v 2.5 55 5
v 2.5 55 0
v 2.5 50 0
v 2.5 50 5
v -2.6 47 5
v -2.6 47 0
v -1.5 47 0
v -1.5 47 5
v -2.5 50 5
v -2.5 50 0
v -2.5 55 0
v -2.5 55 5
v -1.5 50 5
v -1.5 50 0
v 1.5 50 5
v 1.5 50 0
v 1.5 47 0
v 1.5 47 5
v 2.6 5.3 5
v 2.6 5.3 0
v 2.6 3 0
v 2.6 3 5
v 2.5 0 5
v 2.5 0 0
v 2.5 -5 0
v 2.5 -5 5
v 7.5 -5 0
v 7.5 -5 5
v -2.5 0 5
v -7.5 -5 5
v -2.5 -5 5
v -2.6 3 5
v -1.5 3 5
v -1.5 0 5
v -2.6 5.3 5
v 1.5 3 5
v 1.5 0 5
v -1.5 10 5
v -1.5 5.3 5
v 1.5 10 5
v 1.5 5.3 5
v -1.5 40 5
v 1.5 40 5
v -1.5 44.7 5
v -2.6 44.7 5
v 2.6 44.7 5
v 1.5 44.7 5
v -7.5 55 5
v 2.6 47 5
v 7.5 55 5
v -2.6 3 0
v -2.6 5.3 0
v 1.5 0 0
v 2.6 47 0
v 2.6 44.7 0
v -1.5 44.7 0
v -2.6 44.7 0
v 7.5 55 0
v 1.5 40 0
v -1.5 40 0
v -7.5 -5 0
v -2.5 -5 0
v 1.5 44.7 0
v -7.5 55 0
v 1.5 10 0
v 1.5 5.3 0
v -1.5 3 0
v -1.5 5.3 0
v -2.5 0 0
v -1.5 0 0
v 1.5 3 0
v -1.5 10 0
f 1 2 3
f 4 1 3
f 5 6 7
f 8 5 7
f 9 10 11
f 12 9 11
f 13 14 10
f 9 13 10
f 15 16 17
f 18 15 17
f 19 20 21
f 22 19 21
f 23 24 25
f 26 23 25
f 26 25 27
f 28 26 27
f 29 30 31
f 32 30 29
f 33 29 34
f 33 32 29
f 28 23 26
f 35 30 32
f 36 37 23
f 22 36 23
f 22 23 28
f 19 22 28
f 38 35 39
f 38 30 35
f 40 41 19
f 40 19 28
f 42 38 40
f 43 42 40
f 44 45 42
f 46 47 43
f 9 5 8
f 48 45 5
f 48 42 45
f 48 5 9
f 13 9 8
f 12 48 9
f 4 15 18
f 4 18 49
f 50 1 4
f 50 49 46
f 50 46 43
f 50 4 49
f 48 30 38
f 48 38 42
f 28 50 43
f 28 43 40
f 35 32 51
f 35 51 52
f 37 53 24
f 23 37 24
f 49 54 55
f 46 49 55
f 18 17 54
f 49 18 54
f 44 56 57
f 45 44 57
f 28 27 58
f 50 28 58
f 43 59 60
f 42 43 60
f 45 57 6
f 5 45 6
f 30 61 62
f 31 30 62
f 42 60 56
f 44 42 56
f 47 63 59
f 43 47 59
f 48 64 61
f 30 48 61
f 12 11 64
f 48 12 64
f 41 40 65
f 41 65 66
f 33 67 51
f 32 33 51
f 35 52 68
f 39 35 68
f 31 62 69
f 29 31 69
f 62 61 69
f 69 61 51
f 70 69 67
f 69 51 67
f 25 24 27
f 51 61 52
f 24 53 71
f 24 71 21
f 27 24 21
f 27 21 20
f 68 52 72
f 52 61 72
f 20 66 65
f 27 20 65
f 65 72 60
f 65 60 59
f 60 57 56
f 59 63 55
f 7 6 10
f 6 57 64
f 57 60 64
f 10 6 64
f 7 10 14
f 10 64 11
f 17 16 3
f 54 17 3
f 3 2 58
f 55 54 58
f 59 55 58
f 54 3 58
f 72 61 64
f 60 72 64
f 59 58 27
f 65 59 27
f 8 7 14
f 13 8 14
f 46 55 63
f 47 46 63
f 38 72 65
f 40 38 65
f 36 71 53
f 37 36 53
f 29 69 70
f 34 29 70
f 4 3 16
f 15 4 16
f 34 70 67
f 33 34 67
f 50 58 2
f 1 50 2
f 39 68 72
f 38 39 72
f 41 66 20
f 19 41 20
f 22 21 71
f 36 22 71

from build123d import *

# Parameters (mm, degrees)
BOSS_EXTRU_1_DEPTH = 5


with BuildPart() as part:
    # Esquisse1 → Boss.-Extru.1 (new body)
    with BuildSketch(Plane.XY):
        Polygon((-7.5, 50), (-7.5, 25), (7.5, 25), (7.5, 50), (7.5, 55), (2.5, 55), (2.5, 50), (1.5, 50), (1.5, 47), (2.6, 47), (2.6, 44.7), (1.5, 44.7), (1.5, 40), (-1.5, 40), (-1.5, 44.7), (-2.6, 44.7), (-2.6, 47), (-1.5, 47), (-1.5, 50), (-2.5, 50), (-2.5, 55), (-7.5, 55), align=None)
        Polygon((-7.5, 25), (-7.5, 0), (-7.5, -5), (-2.5, -5), (-2.5, 0), (-1.5, 0), (-1.5, 3), (-2.6, 3), (-2.6, 5.3), (-1.5, 5.3), (-1.5, 10), (1.5, 10), (1.5, 5.3), (2.6, 5.3), (2.6, 3), (1.5, 3), (1.5, 0), (2.5, 0), (2.5, -5), (7.5, -5), (7.5, 0), (7.5, 25), align=None)
    extrude(amount=BOSS_EXTRU_1_DEPTH)


solid = part.part
